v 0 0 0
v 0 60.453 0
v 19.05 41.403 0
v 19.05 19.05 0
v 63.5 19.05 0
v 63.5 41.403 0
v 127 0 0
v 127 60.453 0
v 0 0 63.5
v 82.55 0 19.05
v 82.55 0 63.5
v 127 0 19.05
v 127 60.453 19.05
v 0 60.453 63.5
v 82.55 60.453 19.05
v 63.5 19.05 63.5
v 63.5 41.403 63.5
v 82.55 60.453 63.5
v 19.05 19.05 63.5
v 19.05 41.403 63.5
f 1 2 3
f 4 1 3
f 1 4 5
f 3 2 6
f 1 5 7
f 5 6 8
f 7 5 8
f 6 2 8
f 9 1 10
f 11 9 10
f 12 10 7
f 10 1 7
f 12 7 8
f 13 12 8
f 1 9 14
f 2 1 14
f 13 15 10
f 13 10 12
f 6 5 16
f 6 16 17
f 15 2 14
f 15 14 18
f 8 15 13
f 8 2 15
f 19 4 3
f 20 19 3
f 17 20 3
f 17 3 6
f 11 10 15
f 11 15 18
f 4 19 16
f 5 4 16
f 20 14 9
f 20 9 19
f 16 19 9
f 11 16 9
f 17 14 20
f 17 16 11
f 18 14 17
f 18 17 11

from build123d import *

# Parameters (mm, degrees)
F0_W     = 127
F0_H     = 60.452662
F1_DEPTH = 63.5
F2_W     = 44.45
F2_H     = 22.352662
F3_DEPTH = 63.501
F4_W     = 44.45
F4_H     = 44.45
F5_DEPTH = 63.5


with BuildPart() as f1:
    # F0 (on Top) → F1 (new body)
    with BuildSketch(Plane.XY):
        with Locations((63.5, 30.226331)):
            Rectangle(F0_W, F0_H)
    extrude(amount=F1_DEPTH)

    # F2 (on face) → F3 (cut, through all)
    with BuildSketch(Plane.XY.offset(63.5)):
        with Locations((41.275, 30.226331)):
            Rectangle(F2_W, F2_H)
    extrude(amount=-F3_DEPTH, mode=Mode.SUBTRACT)

    # F4 (on face) → F5 (cut)
    with BuildSketch(Plane.XZ):
        with Locations((104.775, 41.275)):
            Rectangle(F4_W, F4_H)
    extrude(amount=-F5_DEPTH, mode=Mode.SUBTRACT)


solid = f1.part
